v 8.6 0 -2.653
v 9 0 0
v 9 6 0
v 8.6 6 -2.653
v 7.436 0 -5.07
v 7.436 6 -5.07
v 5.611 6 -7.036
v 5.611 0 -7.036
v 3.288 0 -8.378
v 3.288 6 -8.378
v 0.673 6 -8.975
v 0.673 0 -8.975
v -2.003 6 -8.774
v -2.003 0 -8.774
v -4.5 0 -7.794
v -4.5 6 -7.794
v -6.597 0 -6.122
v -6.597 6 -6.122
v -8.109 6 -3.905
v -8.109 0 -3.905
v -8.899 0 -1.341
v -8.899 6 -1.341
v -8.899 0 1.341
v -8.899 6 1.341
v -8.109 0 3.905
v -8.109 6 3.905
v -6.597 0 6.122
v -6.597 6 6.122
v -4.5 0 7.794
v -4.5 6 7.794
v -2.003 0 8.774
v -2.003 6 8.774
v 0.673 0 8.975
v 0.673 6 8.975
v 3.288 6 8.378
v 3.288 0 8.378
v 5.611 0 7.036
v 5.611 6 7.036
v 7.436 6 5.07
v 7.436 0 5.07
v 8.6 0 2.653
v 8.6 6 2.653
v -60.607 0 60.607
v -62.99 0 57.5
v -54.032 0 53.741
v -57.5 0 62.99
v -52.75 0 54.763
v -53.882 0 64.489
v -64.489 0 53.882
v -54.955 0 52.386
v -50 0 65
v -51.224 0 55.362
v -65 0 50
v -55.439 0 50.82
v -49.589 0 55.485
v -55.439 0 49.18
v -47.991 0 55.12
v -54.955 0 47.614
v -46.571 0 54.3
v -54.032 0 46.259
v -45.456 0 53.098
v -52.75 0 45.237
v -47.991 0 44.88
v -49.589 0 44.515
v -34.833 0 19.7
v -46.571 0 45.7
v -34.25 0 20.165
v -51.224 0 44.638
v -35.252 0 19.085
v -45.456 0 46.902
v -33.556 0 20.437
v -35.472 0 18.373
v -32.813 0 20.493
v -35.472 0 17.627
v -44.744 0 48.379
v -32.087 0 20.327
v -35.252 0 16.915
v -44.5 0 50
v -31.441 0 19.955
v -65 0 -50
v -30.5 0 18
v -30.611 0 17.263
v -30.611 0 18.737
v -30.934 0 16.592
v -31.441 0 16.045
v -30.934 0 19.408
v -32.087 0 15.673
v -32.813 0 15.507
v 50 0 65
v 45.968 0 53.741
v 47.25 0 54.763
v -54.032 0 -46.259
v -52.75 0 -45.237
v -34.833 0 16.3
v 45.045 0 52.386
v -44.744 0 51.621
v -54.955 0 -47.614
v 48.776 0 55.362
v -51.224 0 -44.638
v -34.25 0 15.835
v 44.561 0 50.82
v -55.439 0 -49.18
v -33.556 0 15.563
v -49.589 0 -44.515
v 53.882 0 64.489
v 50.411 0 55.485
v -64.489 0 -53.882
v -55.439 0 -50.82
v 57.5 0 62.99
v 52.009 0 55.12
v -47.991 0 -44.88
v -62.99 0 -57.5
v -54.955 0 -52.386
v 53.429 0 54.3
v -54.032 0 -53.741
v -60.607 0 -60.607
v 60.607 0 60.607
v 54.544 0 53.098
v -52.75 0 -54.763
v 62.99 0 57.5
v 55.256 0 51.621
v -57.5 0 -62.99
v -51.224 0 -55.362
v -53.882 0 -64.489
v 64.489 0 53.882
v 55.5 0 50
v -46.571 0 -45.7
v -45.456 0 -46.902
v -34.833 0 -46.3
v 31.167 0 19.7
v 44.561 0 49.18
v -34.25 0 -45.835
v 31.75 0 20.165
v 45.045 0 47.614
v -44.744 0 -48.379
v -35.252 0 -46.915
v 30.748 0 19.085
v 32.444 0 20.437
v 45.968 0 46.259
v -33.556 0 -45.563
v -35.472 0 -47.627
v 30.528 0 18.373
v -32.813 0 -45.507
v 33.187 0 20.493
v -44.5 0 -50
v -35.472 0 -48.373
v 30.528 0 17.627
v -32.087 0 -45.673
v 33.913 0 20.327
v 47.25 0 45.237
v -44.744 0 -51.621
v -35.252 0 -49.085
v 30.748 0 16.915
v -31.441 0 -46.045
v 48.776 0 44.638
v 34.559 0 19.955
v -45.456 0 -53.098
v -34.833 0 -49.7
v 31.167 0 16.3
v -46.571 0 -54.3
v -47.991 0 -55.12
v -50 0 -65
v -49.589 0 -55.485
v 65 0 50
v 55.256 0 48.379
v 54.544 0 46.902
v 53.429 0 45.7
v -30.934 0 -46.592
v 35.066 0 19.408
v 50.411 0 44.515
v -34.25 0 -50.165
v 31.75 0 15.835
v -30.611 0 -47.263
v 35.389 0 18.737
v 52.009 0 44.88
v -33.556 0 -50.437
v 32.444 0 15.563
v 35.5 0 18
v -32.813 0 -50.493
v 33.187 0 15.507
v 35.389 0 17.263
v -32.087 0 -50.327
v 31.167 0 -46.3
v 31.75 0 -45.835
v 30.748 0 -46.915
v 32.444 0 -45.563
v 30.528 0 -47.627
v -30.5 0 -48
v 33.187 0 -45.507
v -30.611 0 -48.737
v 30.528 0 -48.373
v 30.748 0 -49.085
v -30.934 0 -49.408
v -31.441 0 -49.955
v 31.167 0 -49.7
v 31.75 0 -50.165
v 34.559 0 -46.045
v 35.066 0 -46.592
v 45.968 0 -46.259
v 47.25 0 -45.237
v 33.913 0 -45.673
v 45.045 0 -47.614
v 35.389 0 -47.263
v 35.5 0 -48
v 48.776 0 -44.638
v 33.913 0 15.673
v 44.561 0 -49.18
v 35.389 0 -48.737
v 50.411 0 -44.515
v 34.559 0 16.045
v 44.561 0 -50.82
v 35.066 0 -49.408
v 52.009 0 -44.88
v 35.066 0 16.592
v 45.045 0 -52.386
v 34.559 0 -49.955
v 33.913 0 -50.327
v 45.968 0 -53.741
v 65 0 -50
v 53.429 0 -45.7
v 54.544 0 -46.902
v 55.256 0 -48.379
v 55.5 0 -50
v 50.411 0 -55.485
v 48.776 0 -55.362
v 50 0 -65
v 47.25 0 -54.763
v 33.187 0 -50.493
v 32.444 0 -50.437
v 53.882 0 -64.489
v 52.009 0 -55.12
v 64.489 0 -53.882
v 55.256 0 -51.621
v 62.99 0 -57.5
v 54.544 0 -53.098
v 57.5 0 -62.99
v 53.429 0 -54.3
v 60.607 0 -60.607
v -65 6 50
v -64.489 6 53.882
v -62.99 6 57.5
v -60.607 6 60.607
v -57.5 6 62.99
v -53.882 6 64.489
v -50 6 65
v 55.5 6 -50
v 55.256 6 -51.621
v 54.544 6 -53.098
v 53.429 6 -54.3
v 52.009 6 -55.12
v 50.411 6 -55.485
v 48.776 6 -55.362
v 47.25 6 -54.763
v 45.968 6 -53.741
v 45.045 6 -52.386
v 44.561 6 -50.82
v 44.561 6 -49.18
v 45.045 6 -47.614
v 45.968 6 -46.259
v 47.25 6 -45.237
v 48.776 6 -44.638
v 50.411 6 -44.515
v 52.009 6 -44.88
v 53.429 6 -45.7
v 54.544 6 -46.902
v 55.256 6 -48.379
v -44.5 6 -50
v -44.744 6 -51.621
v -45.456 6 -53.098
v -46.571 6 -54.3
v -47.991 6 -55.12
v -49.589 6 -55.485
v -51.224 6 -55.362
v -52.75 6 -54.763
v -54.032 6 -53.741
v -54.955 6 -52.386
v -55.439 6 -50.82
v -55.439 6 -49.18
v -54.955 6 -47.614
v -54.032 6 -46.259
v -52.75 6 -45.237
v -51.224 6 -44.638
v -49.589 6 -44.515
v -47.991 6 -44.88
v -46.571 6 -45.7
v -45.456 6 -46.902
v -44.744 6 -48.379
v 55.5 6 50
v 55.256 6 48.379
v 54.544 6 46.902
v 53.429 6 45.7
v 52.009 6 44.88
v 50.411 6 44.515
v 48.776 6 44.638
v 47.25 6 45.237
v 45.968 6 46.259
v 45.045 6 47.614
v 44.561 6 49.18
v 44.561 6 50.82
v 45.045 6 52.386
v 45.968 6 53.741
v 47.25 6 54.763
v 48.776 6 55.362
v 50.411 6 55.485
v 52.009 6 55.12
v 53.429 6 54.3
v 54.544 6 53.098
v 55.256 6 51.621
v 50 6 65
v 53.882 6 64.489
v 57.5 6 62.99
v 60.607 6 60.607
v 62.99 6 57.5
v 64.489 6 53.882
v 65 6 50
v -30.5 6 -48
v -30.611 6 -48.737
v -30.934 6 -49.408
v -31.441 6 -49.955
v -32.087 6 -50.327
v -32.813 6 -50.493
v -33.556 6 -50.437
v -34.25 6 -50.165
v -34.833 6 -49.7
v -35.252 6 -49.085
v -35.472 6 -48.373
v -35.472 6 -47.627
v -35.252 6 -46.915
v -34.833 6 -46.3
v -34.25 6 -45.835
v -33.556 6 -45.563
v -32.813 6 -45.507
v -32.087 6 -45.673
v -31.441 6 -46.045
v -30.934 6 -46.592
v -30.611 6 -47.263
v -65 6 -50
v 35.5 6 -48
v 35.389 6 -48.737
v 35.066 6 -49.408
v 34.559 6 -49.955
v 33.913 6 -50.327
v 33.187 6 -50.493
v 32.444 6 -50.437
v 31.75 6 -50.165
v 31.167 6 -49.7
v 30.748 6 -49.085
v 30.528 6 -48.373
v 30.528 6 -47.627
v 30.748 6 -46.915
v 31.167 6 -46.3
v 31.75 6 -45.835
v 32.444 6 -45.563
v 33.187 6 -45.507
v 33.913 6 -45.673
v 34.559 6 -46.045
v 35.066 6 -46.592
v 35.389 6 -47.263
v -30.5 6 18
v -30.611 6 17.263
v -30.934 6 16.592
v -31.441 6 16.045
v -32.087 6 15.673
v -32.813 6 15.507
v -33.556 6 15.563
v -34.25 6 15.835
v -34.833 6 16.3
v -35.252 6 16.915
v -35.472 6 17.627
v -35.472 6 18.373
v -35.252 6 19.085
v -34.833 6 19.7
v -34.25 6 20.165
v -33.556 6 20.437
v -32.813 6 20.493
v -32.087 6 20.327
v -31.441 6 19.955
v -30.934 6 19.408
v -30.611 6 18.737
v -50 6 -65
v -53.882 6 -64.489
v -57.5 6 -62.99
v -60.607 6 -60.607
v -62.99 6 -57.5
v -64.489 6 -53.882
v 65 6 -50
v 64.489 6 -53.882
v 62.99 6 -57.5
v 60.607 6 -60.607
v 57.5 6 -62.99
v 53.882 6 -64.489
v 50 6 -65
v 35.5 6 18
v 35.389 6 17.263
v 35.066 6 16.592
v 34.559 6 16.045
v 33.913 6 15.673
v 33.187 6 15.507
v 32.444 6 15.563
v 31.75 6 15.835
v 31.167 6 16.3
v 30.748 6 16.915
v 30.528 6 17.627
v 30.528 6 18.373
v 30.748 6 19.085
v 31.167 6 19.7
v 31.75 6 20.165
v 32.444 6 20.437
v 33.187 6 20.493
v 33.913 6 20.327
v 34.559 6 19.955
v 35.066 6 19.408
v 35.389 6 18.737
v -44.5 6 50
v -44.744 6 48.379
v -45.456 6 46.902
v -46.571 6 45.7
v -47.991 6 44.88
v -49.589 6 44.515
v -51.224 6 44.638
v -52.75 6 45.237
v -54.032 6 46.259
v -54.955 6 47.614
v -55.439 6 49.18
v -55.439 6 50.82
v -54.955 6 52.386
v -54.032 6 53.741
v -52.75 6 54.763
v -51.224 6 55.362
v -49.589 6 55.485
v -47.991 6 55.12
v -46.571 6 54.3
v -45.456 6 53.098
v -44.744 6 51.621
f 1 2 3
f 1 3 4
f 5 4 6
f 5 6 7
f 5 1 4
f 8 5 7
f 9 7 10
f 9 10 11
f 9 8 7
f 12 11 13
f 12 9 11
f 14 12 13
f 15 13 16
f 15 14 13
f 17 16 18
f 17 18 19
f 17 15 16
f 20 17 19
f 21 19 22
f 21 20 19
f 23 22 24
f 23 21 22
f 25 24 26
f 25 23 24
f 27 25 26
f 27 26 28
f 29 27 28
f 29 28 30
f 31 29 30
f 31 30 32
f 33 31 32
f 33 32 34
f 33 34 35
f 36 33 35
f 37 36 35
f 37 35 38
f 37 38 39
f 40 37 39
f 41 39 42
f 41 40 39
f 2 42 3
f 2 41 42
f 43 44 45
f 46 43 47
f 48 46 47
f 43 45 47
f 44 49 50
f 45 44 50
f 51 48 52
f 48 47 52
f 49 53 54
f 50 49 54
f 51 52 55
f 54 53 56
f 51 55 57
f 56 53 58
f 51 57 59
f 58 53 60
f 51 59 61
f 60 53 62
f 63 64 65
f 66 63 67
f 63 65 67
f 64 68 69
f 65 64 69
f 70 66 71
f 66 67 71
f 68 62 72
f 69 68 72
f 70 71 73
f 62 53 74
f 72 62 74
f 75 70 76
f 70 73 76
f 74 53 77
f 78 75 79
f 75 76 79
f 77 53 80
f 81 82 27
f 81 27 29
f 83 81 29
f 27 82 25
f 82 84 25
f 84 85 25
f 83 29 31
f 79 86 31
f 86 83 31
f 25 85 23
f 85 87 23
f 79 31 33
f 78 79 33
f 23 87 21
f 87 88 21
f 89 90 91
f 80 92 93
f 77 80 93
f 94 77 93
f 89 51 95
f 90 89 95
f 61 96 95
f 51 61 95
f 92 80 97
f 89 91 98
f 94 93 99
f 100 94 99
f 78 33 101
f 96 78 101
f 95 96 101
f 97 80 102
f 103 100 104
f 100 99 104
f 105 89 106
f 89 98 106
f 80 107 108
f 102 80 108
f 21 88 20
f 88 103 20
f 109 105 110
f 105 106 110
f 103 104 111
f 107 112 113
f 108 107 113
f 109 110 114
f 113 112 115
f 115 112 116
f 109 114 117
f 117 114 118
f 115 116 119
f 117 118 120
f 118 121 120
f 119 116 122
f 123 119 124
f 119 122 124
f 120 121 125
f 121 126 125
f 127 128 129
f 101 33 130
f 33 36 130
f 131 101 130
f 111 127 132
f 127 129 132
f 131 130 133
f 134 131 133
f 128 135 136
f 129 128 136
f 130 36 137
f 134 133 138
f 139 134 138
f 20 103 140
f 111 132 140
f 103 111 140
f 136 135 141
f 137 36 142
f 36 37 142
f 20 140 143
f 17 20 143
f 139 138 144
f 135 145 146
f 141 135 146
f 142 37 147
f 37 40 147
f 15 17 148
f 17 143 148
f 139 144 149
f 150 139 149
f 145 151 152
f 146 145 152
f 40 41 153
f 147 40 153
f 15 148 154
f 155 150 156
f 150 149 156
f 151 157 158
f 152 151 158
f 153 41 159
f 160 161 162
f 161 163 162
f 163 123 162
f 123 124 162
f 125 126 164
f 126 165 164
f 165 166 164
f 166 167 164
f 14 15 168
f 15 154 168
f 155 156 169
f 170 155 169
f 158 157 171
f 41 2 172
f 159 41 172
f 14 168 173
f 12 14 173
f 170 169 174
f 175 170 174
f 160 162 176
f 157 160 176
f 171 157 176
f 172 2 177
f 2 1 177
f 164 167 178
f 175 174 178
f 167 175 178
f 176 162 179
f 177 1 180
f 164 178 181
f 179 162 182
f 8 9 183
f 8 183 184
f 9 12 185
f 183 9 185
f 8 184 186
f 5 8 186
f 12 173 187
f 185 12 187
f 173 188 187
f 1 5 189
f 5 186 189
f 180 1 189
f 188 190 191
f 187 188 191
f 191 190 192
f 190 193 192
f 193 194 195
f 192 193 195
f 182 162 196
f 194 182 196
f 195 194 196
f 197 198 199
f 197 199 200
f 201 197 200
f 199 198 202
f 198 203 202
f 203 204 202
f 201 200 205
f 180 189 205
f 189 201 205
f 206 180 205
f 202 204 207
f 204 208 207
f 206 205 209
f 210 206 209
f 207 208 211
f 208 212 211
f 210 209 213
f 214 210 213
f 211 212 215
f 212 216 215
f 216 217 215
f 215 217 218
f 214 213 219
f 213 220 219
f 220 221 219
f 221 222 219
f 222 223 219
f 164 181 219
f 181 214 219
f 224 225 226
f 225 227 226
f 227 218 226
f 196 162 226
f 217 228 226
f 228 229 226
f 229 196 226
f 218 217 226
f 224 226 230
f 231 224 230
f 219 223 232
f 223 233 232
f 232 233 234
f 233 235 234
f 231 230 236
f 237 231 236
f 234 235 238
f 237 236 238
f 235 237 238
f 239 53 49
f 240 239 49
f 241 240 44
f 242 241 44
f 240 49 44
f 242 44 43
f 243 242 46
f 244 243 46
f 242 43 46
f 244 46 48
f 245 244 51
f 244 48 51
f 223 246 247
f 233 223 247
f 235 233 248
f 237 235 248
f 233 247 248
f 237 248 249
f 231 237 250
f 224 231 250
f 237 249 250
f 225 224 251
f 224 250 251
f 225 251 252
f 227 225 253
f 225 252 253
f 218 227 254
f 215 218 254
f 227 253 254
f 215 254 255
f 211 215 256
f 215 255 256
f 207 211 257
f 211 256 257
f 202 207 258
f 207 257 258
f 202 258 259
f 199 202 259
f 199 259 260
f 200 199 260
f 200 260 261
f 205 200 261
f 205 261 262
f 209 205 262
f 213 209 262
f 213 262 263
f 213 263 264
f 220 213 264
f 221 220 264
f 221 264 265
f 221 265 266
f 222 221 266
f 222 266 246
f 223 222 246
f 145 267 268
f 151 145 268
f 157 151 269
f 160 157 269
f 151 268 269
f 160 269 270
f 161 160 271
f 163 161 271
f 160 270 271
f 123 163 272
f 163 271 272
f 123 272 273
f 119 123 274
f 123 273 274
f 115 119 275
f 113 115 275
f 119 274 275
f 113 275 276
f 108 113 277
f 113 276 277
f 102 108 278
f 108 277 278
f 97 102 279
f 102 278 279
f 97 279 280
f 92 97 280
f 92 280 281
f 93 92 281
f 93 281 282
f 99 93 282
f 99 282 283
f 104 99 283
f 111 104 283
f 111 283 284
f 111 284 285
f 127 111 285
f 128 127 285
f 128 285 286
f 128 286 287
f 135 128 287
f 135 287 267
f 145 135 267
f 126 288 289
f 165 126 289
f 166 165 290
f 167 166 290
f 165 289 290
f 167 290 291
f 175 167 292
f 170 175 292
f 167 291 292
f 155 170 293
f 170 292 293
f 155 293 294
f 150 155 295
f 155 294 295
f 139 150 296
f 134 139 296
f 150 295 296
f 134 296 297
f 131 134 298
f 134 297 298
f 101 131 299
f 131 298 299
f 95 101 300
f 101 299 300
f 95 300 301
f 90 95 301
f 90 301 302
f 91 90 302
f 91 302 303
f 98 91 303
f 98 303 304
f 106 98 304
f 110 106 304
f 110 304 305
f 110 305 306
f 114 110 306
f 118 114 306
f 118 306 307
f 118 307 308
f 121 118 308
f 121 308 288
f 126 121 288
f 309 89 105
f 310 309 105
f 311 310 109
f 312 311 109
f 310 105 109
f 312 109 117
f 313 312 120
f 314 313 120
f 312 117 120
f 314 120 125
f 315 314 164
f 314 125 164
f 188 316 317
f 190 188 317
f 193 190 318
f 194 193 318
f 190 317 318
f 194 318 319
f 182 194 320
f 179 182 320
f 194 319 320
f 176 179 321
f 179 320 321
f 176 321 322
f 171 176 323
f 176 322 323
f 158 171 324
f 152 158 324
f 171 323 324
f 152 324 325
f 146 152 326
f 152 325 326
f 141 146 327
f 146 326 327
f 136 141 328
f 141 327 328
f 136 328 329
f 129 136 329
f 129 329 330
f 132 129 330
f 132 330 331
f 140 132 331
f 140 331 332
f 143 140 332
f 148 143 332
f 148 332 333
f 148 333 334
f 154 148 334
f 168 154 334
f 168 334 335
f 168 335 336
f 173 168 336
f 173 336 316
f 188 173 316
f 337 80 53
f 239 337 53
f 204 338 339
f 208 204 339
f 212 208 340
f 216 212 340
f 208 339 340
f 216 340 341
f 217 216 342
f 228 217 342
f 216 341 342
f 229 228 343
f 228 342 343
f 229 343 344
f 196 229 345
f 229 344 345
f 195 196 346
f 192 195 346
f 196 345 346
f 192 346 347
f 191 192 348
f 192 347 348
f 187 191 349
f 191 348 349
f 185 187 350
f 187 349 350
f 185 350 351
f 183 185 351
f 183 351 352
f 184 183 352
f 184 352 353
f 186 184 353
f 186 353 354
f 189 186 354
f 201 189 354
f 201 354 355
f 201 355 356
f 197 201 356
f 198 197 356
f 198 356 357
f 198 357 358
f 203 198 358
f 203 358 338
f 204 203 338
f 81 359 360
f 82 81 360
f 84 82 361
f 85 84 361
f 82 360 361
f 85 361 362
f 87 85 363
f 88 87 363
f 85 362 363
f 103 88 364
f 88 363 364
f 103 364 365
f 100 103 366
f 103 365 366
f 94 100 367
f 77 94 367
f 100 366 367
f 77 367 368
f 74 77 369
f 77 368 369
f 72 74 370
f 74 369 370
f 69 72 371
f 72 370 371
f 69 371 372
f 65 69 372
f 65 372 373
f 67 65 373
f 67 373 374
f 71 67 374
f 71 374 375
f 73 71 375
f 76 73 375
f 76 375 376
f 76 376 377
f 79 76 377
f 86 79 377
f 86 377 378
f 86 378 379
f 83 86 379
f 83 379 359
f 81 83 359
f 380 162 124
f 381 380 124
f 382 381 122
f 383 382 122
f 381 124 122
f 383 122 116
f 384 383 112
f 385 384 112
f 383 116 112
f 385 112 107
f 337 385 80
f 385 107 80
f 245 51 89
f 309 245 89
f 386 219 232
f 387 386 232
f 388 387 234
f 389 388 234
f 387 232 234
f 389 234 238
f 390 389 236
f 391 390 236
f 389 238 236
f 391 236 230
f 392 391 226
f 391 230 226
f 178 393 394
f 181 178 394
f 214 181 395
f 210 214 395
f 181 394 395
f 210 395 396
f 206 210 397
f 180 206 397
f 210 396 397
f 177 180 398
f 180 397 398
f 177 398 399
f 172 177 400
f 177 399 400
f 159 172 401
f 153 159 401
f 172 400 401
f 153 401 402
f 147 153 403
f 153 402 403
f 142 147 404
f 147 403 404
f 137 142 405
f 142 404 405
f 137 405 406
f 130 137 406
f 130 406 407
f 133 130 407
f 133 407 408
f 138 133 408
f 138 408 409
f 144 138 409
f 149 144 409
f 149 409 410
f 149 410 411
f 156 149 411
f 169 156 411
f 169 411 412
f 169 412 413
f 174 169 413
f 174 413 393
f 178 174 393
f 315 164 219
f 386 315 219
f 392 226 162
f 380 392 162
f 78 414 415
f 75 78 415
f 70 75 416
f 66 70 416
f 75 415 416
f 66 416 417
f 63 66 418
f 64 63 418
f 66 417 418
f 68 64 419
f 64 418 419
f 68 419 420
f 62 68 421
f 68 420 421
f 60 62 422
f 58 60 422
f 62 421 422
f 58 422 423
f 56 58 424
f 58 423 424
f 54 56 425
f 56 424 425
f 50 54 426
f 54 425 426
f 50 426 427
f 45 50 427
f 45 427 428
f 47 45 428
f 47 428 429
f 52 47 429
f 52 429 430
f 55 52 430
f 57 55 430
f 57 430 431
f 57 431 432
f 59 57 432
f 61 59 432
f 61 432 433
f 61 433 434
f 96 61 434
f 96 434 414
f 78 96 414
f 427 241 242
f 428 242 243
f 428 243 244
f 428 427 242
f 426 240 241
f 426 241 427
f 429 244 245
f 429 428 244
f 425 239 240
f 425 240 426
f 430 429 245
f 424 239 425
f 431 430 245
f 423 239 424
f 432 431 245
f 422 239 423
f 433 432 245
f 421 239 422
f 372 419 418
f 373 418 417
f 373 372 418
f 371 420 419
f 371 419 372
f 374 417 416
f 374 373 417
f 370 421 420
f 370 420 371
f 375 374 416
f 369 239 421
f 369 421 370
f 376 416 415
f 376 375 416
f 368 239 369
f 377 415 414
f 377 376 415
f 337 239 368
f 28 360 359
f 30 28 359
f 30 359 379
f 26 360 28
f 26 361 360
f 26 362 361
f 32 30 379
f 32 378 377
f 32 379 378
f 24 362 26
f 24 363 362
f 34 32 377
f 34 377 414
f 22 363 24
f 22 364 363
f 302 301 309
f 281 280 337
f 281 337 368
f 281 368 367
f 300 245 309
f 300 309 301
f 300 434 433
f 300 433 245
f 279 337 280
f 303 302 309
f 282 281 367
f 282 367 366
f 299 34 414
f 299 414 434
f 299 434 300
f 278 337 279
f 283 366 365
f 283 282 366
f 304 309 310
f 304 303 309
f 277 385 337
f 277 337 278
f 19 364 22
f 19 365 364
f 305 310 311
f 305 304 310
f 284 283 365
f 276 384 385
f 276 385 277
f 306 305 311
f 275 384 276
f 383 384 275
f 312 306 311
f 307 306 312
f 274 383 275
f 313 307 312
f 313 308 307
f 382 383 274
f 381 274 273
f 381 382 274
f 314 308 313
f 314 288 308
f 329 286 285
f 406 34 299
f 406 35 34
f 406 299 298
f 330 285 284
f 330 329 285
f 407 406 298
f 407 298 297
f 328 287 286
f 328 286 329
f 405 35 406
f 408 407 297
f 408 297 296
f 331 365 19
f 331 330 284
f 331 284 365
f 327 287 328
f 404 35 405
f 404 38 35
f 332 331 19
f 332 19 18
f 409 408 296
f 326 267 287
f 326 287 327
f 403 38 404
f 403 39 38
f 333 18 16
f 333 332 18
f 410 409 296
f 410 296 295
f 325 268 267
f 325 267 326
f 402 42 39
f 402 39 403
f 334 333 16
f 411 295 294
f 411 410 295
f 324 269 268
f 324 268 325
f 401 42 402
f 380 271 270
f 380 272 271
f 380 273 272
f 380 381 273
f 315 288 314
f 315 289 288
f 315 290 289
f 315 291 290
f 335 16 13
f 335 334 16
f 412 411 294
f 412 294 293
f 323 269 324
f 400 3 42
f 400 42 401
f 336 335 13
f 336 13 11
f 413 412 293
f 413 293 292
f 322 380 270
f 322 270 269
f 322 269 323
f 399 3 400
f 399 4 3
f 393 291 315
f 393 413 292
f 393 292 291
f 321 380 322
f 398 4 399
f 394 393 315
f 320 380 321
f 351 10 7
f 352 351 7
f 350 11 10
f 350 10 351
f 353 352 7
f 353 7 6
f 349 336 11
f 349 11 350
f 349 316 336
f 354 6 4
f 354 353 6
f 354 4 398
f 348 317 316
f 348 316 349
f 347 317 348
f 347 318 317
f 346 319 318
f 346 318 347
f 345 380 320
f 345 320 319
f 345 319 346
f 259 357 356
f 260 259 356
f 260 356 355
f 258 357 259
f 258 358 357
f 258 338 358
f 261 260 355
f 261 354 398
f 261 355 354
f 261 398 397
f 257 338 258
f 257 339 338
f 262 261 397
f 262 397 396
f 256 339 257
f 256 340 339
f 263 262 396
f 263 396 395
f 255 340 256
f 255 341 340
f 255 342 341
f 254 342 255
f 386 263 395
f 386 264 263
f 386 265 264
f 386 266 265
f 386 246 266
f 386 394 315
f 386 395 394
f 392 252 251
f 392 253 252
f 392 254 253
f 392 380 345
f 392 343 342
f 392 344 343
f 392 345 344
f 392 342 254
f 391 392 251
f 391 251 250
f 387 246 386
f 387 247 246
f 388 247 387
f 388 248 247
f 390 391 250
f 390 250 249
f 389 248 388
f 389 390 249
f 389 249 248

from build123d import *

# Parameters (mm, degrees)
SKETCH1_R               = 9
BOSS_EXTRUDE1_DEPTH     = 6
SKETCH3_R               = 5.5
CUT_EXTRUDE2_DEPTH      = 1
CUT_EXTRUDE2_DEPTH_BACK = 7
CUT_EXTRUDE3_REACH      = 8
SKETCH6_R               = 2.5


with BuildPart() as part:
    # Sketch1 → Boss-Extrude1 (new body)
    with BuildSketch(Plane(origin=(0, 0, 0), x_dir=(1, 0, 0), z_dir=(0, 1, 0))):
        with BuildLine():
            Line((-50, -65), (50, -65))
            ThreePointArc((50, -65), (60.606601718, -60.606601718), (65, -50))
            Line((65, -50), (65, 50))
            ThreePointArc((65, 50), (60.606601718, 60.606601718), (50, 65))
            Line((50, 65), (-50, 65))
            ThreePointArc((-50, 65), (-60.606601718, 60.606601718), (-65, 50))
            Line((-65, 50), (-65, -50))
            ThreePointArc((-65, -50), (-60.606601718, -60.606601718), (-50, -65))
        make_face()
        Circle(SKETCH1_R, mode=Mode.SUBTRACT)
    extrude(amount=BOSS_EXTRUDE1_DEPTH)

    # Sketch3 → Cut-Extrude2 (cut, two sides)
    with BuildSketch(Plane(origin=(0, 6, 0), x_dir=(1, 0, 0), z_dir=(0, 1, 0))) as cut_extrude2_sk:
        with Locations((-50, 50)):
            Circle(SKETCH3_R)
        with Locations((50, 50)):
            Circle(SKETCH3_R)
        with Locations((50, -50)):
            Circle(SKETCH3_R)
        with Locations((-50, -50)):
            Circle(SKETCH3_R)
    extrude(amount=CUT_EXTRUDE2_DEPTH, mode=Mode.SUBTRACT)
    extrude(cut_extrude2_sk.sketch, amount=-CUT_EXTRUDE2_DEPTH_BACK, mode=Mode.SUBTRACT)

    # Sketch6 → Cut-Extrude3 (cut, up to next)
    with BuildSketch(Plane(origin=(0, 6, 0), x_dir=(1, 0, 0), z_dir=(0, 1, 0)), mode=Mode.PRIVATE) as cut_extrude3_sk1:
        with Locations((33, 48)):
            Circle(SKETCH6_R)
    cut_extrude3_tool1 = extrude(cut_extrude3_sk1.sketch, amount=-CUT_EXTRUDE3_REACH, mode=Mode.PRIVATE) & part.part
    add(cut_extrude3_tool1.solids().sort_by_distance((33, 6, -48))[0], mode=Mode.SUBTRACT)
    # Sketch6 → Cut-Extrude3 (cut, up to next)
    with BuildSketch(Plane(origin=(0, 6, 0), x_dir=(1, 0, 0), z_dir=(0, 1, 0)), mode=Mode.PRIVATE) as cut_extrude3_sk2:
        with Locations((33, -18)):
            Circle(SKETCH6_R)
    cut_extrude3_tool2 = extrude(cut_extrude3_sk2.sketch, amount=-CUT_EXTRUDE3_REACH, mode=Mode.PRIVATE) & part.part
    add(cut_extrude3_tool2.solids().sort_by_distance((33, 6, 18))[0], mode=Mode.SUBTRACT)
    # Sketch6 → Cut-Extrude3 (cut, up to next)
    with BuildSketch(Plane(origin=(0, 6, 0), x_dir=(1, 0, 0), z_dir=(0, 1, 0)), mode=Mode.PRIVATE) as cut_extrude3_sk3:
        with Locations((-33, 48)):
            Circle(SKETCH6_R)
    cut_extrude3_tool3 = extrude(cut_extrude3_sk3.sketch, amount=-CUT_EXTRUDE3_REACH, mode=Mode.PRIVATE) & part.part
    add(cut_extrude3_tool3.solids().sort_by_distance((-33, 6, -48))[0], mode=Mode.SUBTRACT)
    # Sketch6 → Cut-Extrude3 (cut, up to next)
    with BuildSketch(Plane(origin=(0, 6, 0), x_dir=(1, 0, 0), z_dir=(0, 1, 0)), mode=Mode.PRIVATE) as cut_extrude3_sk4:
        with Locations((-33, -18)):
            Circle(SKETCH6_R)
    cut_extrude3_tool4 = extrude(cut_extrude3_sk4.sketch, amount=-CUT_EXTRUDE3_REACH, mode=Mode.PRIVATE) & part.part
    add(cut_extrude3_tool4.solids().sort_by_distance((-33, 6, 18))[0], mode=Mode.SUBTRACT)


solid = part.part
